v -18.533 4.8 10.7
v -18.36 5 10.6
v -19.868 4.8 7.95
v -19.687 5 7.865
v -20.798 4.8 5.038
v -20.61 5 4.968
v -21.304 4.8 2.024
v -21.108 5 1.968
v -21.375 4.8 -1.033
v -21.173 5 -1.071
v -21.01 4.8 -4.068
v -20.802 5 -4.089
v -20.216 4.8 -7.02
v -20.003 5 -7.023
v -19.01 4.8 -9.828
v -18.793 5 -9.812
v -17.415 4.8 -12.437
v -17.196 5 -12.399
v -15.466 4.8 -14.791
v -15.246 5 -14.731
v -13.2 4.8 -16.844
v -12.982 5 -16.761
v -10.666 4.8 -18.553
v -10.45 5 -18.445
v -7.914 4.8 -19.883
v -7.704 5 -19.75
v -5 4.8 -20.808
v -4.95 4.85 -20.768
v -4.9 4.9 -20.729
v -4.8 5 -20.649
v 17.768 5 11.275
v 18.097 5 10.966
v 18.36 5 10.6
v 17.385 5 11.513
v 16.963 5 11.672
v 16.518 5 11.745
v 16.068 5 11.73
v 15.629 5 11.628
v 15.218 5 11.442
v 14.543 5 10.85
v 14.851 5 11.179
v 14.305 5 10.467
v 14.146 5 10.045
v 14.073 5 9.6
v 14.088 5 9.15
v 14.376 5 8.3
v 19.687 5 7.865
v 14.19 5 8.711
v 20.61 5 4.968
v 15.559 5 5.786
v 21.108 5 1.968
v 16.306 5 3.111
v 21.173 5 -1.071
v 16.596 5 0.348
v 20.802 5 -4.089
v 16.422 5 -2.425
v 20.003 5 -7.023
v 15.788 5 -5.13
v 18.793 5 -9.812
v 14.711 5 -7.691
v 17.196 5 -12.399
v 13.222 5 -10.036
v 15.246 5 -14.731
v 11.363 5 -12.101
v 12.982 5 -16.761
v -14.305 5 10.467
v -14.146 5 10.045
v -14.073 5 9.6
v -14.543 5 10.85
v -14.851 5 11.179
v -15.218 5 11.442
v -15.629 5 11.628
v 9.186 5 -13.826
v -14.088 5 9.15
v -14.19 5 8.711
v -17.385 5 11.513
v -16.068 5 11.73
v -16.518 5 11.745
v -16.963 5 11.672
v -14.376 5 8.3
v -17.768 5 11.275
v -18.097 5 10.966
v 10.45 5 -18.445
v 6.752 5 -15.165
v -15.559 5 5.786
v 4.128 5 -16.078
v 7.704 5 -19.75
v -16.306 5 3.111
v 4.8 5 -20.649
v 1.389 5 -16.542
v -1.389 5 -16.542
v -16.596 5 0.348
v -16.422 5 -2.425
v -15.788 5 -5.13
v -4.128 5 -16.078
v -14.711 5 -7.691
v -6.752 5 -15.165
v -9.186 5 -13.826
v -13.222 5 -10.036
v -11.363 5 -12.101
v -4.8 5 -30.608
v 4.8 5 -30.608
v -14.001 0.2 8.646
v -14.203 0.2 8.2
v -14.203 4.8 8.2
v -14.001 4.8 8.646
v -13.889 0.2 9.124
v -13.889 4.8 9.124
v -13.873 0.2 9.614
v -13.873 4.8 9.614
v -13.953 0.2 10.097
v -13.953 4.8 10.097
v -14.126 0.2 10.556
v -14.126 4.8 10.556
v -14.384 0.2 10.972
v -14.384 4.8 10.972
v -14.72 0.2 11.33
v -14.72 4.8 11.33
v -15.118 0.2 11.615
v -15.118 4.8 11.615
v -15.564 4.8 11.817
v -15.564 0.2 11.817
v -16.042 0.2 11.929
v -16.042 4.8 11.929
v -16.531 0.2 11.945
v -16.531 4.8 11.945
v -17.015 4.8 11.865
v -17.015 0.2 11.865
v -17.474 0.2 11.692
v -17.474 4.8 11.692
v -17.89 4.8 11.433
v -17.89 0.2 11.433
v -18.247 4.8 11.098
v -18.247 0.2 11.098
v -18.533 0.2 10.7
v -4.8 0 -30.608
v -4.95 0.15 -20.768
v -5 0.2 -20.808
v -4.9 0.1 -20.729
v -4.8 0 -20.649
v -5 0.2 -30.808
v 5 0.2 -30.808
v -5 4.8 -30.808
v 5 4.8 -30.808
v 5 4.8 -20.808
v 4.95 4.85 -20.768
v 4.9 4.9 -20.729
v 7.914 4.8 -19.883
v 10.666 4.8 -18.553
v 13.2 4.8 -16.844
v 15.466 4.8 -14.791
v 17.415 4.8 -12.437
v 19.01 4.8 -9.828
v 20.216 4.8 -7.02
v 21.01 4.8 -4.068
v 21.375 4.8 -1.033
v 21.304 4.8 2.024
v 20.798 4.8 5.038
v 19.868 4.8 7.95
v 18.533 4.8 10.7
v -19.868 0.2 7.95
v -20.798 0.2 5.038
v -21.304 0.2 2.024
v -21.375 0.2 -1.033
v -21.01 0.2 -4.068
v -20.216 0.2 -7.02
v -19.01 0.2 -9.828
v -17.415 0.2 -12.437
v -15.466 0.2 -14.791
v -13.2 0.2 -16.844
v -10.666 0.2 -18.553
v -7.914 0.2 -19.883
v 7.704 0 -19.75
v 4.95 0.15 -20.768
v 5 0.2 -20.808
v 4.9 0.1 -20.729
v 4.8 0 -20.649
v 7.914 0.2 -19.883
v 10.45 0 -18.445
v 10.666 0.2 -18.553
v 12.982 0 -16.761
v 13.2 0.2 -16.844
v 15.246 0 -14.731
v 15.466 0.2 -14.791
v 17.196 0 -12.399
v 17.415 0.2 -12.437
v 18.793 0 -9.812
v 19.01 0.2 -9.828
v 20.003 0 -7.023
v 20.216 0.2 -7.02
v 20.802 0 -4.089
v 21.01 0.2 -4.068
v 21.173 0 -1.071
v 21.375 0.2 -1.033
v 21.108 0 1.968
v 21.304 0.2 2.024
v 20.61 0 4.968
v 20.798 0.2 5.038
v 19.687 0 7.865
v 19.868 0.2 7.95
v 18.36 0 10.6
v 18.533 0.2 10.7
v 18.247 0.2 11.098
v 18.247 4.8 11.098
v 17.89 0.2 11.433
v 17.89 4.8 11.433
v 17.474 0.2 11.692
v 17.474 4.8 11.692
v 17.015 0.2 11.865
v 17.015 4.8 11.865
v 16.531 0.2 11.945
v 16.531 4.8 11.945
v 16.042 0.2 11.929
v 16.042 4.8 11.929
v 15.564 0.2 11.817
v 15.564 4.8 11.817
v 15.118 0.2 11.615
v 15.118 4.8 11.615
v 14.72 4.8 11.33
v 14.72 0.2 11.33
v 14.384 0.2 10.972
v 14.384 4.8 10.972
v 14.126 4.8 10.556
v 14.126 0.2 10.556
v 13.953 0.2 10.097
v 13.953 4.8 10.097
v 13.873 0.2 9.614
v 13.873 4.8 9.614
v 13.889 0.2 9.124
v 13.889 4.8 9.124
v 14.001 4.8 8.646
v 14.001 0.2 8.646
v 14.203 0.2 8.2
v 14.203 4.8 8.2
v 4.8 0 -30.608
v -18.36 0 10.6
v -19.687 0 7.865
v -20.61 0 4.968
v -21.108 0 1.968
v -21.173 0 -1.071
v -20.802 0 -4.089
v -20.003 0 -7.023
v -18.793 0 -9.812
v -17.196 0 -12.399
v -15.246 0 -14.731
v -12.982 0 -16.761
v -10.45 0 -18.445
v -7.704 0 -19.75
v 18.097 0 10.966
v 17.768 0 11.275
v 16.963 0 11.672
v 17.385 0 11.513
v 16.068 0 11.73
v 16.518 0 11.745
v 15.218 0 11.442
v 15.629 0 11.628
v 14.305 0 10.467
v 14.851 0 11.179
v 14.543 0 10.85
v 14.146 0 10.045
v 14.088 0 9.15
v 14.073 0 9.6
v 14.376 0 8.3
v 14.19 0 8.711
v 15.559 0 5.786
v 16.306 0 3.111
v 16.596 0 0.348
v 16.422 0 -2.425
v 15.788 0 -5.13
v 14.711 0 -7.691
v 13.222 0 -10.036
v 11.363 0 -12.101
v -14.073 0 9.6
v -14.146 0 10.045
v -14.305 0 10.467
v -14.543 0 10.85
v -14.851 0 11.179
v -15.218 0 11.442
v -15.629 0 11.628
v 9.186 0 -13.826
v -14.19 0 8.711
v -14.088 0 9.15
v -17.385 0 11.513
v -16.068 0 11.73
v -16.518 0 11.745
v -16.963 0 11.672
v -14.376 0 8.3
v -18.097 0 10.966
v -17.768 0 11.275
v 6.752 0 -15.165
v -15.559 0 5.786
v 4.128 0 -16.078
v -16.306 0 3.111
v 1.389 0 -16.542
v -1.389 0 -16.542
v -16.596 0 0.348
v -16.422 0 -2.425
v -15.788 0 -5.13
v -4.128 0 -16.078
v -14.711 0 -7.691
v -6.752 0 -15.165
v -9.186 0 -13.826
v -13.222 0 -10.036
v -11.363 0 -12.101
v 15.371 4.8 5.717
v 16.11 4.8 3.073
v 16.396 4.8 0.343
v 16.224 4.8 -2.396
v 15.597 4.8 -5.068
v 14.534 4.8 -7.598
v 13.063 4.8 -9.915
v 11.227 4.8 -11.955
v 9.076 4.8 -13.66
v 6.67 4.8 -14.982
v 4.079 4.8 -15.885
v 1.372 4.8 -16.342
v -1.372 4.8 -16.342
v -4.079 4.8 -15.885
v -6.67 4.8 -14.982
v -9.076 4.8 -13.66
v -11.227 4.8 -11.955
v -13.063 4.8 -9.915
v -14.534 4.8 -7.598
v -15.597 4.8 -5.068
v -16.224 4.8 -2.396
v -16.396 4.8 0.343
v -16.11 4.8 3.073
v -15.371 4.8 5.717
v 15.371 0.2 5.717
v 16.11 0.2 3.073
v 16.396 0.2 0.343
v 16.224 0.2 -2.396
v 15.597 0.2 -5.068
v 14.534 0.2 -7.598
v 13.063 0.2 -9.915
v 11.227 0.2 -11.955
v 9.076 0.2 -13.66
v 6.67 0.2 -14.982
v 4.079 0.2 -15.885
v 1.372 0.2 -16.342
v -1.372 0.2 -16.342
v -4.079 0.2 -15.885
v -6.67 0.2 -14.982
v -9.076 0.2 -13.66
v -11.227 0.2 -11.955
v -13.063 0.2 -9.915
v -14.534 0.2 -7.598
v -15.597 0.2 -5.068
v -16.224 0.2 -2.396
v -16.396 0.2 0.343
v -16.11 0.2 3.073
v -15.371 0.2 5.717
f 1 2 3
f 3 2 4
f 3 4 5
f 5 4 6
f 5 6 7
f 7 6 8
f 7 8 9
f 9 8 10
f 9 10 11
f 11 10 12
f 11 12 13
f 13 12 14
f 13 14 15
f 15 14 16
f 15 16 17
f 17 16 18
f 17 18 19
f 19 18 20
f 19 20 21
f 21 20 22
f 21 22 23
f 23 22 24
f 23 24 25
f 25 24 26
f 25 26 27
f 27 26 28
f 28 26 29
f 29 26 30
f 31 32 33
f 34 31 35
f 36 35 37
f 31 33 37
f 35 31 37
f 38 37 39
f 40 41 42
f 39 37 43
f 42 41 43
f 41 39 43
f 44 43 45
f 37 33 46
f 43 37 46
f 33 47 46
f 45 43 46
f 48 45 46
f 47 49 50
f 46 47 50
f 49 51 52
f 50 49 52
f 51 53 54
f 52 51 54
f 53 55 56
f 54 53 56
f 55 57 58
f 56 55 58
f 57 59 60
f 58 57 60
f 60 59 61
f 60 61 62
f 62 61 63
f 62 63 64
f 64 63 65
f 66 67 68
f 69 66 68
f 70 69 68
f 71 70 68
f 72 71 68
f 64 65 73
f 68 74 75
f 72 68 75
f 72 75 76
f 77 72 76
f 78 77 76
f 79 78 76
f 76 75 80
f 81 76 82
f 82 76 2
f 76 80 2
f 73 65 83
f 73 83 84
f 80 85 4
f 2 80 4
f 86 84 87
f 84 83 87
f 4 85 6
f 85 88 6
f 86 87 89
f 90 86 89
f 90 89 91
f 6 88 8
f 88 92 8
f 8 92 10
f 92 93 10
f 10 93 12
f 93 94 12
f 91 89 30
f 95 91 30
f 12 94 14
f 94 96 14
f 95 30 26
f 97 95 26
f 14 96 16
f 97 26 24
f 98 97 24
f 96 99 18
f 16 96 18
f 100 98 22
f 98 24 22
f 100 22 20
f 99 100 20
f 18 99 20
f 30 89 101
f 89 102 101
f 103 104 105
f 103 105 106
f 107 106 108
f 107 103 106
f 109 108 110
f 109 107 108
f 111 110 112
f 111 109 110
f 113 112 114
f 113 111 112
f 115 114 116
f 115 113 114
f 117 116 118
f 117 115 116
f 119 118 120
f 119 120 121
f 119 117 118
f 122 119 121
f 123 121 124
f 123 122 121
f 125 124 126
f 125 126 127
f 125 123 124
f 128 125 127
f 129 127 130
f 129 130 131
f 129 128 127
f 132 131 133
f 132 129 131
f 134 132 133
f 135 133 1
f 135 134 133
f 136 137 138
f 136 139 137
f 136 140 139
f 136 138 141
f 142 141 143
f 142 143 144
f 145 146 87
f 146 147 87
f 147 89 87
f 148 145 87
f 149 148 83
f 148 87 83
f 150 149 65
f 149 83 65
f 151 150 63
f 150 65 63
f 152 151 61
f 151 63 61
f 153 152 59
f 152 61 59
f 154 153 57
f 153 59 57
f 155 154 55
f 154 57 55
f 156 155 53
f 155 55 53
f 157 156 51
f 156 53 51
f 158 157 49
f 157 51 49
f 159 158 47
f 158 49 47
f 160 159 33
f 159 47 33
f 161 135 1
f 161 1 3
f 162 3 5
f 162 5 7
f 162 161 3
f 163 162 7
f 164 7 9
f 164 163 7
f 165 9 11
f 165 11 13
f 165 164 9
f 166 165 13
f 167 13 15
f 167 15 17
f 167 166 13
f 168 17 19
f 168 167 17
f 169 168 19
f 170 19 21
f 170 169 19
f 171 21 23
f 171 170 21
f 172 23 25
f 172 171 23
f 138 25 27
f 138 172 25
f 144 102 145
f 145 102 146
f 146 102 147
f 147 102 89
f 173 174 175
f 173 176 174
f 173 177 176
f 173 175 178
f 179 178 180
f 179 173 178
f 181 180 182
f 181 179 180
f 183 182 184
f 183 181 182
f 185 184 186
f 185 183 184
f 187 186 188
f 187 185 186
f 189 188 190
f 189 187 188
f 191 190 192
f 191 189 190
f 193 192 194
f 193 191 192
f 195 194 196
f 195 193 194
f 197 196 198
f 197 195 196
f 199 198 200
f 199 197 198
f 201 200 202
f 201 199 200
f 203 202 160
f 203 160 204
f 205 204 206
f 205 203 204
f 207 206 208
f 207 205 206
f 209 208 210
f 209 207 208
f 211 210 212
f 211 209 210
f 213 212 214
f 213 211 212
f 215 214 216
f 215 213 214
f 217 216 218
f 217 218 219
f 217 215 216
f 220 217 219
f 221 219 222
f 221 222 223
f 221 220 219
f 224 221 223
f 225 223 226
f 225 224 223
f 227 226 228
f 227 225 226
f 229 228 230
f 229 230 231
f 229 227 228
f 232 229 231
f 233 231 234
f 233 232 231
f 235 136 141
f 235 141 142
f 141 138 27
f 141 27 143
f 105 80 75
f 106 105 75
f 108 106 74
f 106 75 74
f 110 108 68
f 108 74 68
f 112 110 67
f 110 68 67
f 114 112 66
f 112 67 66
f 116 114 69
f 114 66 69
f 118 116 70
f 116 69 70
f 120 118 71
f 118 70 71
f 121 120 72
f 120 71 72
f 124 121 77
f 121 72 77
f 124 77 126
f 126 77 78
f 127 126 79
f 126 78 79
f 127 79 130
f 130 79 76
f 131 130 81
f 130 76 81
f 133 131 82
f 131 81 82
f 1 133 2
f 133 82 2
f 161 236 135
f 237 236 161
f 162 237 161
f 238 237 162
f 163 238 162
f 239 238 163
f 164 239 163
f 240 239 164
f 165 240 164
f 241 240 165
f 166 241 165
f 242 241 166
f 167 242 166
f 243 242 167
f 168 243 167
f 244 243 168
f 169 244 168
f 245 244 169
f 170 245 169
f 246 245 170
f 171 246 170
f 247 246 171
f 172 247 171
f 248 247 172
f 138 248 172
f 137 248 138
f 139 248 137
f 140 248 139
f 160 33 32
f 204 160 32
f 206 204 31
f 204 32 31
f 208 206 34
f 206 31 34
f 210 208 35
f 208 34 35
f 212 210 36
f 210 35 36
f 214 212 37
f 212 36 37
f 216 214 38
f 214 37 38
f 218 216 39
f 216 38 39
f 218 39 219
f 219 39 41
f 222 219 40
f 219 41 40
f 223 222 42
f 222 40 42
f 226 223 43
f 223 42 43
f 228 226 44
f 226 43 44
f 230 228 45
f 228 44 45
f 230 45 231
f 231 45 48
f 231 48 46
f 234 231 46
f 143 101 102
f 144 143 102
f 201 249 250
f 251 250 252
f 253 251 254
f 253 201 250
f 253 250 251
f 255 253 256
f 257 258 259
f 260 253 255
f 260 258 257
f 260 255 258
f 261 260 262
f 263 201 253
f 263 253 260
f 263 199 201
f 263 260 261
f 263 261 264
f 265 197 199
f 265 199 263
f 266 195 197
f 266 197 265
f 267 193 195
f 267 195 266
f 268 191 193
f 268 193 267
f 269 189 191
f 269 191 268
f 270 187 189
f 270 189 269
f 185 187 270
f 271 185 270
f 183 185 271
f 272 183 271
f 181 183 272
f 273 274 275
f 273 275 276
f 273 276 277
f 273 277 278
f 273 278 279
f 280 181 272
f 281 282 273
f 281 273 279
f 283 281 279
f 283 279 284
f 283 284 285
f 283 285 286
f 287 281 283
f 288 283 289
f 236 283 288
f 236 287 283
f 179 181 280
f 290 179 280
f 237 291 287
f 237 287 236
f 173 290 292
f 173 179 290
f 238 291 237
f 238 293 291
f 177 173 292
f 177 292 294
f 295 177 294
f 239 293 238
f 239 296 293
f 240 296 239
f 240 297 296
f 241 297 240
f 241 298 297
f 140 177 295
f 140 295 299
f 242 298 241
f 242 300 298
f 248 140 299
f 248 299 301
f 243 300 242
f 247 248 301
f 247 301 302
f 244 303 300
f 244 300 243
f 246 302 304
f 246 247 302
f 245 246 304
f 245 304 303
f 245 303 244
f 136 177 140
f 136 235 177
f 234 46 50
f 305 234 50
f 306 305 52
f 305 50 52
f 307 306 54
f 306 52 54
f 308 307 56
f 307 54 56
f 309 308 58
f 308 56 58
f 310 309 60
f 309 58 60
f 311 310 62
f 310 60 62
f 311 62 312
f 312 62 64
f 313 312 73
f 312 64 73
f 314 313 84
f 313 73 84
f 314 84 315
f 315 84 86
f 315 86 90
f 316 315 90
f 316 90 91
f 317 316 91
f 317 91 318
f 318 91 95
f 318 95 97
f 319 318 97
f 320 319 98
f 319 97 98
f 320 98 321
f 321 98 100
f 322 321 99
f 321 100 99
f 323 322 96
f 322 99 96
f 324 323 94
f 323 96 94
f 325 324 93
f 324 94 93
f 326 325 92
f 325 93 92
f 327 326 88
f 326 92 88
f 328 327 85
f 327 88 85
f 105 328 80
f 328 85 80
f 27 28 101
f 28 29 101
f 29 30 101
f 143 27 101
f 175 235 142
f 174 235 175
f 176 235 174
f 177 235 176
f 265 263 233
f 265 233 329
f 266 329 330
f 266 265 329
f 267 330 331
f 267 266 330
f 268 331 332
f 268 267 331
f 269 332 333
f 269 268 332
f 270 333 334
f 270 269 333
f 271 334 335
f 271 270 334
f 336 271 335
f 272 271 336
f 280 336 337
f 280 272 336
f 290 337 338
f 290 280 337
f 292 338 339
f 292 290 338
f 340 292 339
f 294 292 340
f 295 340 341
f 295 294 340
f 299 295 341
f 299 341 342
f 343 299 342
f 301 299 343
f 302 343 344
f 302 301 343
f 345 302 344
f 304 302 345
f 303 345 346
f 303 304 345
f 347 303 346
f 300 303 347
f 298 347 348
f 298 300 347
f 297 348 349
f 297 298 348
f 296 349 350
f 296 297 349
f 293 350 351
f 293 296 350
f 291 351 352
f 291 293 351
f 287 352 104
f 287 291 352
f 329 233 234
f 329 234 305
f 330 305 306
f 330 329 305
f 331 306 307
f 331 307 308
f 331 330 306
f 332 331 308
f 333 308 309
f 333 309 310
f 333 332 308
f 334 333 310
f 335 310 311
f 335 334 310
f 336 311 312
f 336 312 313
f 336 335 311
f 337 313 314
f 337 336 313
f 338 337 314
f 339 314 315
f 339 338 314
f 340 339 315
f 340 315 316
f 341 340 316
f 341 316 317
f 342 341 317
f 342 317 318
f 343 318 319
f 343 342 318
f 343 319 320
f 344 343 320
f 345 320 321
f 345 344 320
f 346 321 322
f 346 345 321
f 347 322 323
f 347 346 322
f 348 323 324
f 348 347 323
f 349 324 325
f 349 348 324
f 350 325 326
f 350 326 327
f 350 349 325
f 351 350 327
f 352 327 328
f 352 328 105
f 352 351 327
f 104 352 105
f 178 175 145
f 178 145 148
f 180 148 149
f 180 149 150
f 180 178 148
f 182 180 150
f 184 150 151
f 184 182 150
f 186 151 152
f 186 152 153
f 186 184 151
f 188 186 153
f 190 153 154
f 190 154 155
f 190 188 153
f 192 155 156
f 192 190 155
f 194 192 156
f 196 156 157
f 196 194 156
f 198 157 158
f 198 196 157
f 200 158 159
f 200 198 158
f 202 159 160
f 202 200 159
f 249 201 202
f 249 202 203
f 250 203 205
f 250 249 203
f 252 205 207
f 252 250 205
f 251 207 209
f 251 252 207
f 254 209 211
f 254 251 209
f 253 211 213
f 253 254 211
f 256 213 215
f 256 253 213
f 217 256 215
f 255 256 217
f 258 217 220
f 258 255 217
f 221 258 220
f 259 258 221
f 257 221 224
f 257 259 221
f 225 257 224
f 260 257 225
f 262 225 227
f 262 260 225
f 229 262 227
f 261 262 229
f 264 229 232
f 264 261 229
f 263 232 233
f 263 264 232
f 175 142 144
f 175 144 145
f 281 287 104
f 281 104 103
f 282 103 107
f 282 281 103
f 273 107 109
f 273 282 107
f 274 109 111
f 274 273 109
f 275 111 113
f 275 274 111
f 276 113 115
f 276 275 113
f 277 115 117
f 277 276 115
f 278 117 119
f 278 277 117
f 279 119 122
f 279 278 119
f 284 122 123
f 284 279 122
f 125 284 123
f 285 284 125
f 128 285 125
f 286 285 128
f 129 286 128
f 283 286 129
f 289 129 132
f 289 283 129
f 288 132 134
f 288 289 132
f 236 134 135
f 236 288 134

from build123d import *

# Parameters (mm, degrees)
BOSS_EXTRUDE1_DEPTH = 5
CHAMFER1_SIZE       = 0.2


with BuildPart() as part:
    # Sketch1 → Boss-Extrude1 (new body)
    with BuildSketch(Plane(origin=(0, 0, 0), x_dir=(1, 0, 0), z_dir=(0, 1, 0))):
        with BuildLine():
            Line((-5, 30.807690886), (5, 30.807690886))
            Line((5, 30.807690886), (5, 20.807690886))
            ThreePointArc((5, 20.807690886), (19.662998381, 8.445501445), (18.532943641, -10.7))
            ThreePointArc((18.532943641, -10.7), (15.117880132, -11.615063509), (14.202816622, -8.2))
            ThreePointArc((14.202816622, -8.2), (0, 16.4), (-14.202816622, -8.2))
            ThreePointArc((-14.202816622, -8.2), (-15.117880132, -11.615063509), (-18.532943641, -10.7))
            ThreePointArc((-18.532943641, -10.7), (-19.662998381, 8.445501445), (-5, 20.807690886))
            Line((-5, 20.807690886), (-5, 30.807690886))
        make_face()
    extrude(amount=BOSS_EXTRUDE1_DEPTH)

    # Chamfer1
    chamfer1_edges = [part.edges().sort_by_distance(p)[0] for p in [
        (15.117880132, 0, 11.615063509),
        (0, 0, -16.4),
        (-15.117880132, 0, 11.615063509),
        (-19.662998381, 0, -8.445501445),
        (0, 5, -16.4),
        (15.117880132, 5, 11.615063509),
        (19.662998381, 5, -8.445501445),
        (5, 5, -25.807690886),
        (0, 5, -30.807690886),
        (-5, 5, -25.807690886),
        (-19.662998381, 5, -8.445501445),
        (-5, 0, -25.807690886),
        (-15.117880132, 5, 11.615063509),
        (0, 0, -30.807690886),
        (5, 0, -25.807690886),
        (19.662998381, 0, -8.445501445),
    ]]
    chamfer(chamfer1_edges, length=CHAMFER1_SIZE)


solid = part.part
